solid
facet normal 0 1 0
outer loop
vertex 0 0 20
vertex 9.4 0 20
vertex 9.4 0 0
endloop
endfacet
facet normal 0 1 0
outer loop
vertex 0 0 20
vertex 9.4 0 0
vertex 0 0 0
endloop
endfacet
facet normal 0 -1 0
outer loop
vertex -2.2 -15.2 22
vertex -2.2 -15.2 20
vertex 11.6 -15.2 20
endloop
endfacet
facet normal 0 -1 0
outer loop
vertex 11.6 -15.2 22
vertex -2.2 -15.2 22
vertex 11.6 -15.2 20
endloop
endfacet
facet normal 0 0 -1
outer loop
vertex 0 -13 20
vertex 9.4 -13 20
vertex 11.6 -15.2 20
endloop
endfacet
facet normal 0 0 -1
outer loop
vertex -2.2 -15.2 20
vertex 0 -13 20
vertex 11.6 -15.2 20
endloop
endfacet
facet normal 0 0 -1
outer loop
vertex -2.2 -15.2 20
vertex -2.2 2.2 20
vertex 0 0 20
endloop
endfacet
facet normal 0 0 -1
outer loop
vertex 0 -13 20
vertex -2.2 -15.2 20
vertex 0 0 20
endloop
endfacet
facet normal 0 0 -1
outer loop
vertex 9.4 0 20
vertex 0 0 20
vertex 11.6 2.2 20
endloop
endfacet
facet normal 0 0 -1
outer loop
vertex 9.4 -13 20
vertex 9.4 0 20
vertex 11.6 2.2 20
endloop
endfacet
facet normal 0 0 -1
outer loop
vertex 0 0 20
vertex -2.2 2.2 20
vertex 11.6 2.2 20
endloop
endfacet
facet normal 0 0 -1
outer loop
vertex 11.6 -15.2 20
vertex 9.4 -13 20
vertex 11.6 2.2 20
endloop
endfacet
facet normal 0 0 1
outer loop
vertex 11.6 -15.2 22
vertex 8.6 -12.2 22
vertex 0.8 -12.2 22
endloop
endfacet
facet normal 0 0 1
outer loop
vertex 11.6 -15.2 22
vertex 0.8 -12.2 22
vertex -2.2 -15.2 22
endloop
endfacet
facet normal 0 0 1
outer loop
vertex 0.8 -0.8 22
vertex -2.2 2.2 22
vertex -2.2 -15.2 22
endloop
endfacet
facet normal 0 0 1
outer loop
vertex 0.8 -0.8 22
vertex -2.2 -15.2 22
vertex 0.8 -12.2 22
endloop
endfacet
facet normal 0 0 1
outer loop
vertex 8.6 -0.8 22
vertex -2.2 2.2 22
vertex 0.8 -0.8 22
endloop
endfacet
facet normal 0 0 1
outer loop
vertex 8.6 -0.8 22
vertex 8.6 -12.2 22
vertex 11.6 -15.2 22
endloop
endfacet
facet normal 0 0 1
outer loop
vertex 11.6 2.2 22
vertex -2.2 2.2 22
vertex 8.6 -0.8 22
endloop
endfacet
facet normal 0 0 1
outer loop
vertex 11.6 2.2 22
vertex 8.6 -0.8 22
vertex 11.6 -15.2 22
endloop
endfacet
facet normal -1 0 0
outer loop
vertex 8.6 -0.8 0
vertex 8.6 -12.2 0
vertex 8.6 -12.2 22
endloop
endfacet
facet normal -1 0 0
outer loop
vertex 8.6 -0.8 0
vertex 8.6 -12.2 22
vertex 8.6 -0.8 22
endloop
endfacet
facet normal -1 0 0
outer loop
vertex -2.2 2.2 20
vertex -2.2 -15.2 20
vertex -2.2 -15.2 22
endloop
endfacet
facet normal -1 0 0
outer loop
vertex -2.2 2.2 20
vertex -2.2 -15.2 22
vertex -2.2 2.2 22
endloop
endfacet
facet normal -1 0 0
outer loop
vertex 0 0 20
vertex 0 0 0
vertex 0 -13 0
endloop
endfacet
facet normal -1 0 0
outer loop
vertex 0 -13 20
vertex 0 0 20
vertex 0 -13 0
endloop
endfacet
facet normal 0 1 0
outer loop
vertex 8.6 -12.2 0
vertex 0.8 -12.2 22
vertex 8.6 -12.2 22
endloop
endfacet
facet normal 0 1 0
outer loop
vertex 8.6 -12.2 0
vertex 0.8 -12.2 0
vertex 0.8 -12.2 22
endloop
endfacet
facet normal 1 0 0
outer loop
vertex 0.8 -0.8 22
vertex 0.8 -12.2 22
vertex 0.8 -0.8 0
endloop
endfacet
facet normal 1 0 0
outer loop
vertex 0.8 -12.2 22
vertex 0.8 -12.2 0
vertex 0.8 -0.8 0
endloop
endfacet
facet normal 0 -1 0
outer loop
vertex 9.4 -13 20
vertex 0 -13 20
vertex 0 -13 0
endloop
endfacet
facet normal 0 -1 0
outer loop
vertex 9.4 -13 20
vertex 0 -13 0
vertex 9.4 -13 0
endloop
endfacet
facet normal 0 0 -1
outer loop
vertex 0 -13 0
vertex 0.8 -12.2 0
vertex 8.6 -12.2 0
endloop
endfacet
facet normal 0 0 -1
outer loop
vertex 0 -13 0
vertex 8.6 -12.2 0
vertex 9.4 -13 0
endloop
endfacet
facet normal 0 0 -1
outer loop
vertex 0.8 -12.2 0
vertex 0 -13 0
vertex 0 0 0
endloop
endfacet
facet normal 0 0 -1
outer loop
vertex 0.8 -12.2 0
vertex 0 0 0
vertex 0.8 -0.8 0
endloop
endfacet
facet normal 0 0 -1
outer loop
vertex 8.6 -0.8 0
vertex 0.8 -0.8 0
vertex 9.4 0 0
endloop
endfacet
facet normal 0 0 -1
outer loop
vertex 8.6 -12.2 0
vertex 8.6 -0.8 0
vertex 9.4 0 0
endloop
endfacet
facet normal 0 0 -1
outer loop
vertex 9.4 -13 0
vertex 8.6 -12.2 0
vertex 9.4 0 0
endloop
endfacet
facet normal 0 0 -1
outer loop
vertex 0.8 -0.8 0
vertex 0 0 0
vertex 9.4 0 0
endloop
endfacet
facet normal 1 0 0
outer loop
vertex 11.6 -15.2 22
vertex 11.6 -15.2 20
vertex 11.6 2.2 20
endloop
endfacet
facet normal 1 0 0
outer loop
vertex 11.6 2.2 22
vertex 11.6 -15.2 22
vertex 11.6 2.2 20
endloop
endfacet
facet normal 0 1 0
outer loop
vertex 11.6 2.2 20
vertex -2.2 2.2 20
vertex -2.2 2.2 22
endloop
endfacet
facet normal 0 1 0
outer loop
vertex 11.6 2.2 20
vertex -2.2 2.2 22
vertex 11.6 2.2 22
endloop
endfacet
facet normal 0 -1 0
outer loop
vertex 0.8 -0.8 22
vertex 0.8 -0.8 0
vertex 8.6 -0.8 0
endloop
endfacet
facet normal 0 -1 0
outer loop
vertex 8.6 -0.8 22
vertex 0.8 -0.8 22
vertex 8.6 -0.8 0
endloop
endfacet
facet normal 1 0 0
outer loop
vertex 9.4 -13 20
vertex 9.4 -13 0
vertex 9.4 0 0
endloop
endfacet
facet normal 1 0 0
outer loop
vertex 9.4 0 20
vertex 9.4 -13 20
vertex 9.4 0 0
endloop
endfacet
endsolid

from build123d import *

# Parameters (mm, degrees)
F0_W     = 0.8
F0_H     = 0.8
F0_H_2   = 11.4
F0_W_2   = 7.8
F1_DEPTH = 20
F2_W     = 13.8
F2_H     = 17.4
F2_W_2   = 9.4
F2_H_2   = 13
F2_W_3   = 7.8
F2_H_3   = 11.4
F3_DEPTH = 2


with BuildPart() as f1:
    # F0 (on Top) → F1 (new body)
    with BuildSketch(Plane.XY):
        with Locations((0.4, -0.4)):
            Rectangle(F0_W, F0_H)
        with Locations((0.4, -6.5)):
            Rectangle(F0_W, F0_H_2)
        with Locations((0.4, -12.6)):
            Rectangle(F0_W, F0_H)
        with Locations((4.7, -12.6)):
            Rectangle(F0_W_2, F0_H)
        with Locations((4.7, -0.4)):
            Rectangle(F0_W_2, F0_H)
        with Locations((9, -0.4)):
            Rectangle(F0_W, F0_H)
        with Locations((9, -6.5)):
            Rectangle(F0_W, F0_H_2)
        with Locations((9, -12.6)):
            Rectangle(F0_W, F0_H)
    extrude(amount=F1_DEPTH)

    # F2 (on face) → F3 (join)
    with BuildSketch(Plane.XY.offset(20)):
        with Locations((4.7, -6.5)):
            Rectangle(F2_W, F2_H)
        with Locations((4.7, -6.5)):
            Rectangle(F2_W_2, F2_H_2, mode=Mode.SUBTRACT)
        with Locations((4.7, -6.5)):
            Rectangle(F2_W_2, F2_H_2)
        with Locations((4.7, -6.5)):
            Rectangle(F2_W_3, F2_H_3, mode=Mode.SUBTRACT)
    extrude(amount=F3_DEPTH)


solid = f1.part
